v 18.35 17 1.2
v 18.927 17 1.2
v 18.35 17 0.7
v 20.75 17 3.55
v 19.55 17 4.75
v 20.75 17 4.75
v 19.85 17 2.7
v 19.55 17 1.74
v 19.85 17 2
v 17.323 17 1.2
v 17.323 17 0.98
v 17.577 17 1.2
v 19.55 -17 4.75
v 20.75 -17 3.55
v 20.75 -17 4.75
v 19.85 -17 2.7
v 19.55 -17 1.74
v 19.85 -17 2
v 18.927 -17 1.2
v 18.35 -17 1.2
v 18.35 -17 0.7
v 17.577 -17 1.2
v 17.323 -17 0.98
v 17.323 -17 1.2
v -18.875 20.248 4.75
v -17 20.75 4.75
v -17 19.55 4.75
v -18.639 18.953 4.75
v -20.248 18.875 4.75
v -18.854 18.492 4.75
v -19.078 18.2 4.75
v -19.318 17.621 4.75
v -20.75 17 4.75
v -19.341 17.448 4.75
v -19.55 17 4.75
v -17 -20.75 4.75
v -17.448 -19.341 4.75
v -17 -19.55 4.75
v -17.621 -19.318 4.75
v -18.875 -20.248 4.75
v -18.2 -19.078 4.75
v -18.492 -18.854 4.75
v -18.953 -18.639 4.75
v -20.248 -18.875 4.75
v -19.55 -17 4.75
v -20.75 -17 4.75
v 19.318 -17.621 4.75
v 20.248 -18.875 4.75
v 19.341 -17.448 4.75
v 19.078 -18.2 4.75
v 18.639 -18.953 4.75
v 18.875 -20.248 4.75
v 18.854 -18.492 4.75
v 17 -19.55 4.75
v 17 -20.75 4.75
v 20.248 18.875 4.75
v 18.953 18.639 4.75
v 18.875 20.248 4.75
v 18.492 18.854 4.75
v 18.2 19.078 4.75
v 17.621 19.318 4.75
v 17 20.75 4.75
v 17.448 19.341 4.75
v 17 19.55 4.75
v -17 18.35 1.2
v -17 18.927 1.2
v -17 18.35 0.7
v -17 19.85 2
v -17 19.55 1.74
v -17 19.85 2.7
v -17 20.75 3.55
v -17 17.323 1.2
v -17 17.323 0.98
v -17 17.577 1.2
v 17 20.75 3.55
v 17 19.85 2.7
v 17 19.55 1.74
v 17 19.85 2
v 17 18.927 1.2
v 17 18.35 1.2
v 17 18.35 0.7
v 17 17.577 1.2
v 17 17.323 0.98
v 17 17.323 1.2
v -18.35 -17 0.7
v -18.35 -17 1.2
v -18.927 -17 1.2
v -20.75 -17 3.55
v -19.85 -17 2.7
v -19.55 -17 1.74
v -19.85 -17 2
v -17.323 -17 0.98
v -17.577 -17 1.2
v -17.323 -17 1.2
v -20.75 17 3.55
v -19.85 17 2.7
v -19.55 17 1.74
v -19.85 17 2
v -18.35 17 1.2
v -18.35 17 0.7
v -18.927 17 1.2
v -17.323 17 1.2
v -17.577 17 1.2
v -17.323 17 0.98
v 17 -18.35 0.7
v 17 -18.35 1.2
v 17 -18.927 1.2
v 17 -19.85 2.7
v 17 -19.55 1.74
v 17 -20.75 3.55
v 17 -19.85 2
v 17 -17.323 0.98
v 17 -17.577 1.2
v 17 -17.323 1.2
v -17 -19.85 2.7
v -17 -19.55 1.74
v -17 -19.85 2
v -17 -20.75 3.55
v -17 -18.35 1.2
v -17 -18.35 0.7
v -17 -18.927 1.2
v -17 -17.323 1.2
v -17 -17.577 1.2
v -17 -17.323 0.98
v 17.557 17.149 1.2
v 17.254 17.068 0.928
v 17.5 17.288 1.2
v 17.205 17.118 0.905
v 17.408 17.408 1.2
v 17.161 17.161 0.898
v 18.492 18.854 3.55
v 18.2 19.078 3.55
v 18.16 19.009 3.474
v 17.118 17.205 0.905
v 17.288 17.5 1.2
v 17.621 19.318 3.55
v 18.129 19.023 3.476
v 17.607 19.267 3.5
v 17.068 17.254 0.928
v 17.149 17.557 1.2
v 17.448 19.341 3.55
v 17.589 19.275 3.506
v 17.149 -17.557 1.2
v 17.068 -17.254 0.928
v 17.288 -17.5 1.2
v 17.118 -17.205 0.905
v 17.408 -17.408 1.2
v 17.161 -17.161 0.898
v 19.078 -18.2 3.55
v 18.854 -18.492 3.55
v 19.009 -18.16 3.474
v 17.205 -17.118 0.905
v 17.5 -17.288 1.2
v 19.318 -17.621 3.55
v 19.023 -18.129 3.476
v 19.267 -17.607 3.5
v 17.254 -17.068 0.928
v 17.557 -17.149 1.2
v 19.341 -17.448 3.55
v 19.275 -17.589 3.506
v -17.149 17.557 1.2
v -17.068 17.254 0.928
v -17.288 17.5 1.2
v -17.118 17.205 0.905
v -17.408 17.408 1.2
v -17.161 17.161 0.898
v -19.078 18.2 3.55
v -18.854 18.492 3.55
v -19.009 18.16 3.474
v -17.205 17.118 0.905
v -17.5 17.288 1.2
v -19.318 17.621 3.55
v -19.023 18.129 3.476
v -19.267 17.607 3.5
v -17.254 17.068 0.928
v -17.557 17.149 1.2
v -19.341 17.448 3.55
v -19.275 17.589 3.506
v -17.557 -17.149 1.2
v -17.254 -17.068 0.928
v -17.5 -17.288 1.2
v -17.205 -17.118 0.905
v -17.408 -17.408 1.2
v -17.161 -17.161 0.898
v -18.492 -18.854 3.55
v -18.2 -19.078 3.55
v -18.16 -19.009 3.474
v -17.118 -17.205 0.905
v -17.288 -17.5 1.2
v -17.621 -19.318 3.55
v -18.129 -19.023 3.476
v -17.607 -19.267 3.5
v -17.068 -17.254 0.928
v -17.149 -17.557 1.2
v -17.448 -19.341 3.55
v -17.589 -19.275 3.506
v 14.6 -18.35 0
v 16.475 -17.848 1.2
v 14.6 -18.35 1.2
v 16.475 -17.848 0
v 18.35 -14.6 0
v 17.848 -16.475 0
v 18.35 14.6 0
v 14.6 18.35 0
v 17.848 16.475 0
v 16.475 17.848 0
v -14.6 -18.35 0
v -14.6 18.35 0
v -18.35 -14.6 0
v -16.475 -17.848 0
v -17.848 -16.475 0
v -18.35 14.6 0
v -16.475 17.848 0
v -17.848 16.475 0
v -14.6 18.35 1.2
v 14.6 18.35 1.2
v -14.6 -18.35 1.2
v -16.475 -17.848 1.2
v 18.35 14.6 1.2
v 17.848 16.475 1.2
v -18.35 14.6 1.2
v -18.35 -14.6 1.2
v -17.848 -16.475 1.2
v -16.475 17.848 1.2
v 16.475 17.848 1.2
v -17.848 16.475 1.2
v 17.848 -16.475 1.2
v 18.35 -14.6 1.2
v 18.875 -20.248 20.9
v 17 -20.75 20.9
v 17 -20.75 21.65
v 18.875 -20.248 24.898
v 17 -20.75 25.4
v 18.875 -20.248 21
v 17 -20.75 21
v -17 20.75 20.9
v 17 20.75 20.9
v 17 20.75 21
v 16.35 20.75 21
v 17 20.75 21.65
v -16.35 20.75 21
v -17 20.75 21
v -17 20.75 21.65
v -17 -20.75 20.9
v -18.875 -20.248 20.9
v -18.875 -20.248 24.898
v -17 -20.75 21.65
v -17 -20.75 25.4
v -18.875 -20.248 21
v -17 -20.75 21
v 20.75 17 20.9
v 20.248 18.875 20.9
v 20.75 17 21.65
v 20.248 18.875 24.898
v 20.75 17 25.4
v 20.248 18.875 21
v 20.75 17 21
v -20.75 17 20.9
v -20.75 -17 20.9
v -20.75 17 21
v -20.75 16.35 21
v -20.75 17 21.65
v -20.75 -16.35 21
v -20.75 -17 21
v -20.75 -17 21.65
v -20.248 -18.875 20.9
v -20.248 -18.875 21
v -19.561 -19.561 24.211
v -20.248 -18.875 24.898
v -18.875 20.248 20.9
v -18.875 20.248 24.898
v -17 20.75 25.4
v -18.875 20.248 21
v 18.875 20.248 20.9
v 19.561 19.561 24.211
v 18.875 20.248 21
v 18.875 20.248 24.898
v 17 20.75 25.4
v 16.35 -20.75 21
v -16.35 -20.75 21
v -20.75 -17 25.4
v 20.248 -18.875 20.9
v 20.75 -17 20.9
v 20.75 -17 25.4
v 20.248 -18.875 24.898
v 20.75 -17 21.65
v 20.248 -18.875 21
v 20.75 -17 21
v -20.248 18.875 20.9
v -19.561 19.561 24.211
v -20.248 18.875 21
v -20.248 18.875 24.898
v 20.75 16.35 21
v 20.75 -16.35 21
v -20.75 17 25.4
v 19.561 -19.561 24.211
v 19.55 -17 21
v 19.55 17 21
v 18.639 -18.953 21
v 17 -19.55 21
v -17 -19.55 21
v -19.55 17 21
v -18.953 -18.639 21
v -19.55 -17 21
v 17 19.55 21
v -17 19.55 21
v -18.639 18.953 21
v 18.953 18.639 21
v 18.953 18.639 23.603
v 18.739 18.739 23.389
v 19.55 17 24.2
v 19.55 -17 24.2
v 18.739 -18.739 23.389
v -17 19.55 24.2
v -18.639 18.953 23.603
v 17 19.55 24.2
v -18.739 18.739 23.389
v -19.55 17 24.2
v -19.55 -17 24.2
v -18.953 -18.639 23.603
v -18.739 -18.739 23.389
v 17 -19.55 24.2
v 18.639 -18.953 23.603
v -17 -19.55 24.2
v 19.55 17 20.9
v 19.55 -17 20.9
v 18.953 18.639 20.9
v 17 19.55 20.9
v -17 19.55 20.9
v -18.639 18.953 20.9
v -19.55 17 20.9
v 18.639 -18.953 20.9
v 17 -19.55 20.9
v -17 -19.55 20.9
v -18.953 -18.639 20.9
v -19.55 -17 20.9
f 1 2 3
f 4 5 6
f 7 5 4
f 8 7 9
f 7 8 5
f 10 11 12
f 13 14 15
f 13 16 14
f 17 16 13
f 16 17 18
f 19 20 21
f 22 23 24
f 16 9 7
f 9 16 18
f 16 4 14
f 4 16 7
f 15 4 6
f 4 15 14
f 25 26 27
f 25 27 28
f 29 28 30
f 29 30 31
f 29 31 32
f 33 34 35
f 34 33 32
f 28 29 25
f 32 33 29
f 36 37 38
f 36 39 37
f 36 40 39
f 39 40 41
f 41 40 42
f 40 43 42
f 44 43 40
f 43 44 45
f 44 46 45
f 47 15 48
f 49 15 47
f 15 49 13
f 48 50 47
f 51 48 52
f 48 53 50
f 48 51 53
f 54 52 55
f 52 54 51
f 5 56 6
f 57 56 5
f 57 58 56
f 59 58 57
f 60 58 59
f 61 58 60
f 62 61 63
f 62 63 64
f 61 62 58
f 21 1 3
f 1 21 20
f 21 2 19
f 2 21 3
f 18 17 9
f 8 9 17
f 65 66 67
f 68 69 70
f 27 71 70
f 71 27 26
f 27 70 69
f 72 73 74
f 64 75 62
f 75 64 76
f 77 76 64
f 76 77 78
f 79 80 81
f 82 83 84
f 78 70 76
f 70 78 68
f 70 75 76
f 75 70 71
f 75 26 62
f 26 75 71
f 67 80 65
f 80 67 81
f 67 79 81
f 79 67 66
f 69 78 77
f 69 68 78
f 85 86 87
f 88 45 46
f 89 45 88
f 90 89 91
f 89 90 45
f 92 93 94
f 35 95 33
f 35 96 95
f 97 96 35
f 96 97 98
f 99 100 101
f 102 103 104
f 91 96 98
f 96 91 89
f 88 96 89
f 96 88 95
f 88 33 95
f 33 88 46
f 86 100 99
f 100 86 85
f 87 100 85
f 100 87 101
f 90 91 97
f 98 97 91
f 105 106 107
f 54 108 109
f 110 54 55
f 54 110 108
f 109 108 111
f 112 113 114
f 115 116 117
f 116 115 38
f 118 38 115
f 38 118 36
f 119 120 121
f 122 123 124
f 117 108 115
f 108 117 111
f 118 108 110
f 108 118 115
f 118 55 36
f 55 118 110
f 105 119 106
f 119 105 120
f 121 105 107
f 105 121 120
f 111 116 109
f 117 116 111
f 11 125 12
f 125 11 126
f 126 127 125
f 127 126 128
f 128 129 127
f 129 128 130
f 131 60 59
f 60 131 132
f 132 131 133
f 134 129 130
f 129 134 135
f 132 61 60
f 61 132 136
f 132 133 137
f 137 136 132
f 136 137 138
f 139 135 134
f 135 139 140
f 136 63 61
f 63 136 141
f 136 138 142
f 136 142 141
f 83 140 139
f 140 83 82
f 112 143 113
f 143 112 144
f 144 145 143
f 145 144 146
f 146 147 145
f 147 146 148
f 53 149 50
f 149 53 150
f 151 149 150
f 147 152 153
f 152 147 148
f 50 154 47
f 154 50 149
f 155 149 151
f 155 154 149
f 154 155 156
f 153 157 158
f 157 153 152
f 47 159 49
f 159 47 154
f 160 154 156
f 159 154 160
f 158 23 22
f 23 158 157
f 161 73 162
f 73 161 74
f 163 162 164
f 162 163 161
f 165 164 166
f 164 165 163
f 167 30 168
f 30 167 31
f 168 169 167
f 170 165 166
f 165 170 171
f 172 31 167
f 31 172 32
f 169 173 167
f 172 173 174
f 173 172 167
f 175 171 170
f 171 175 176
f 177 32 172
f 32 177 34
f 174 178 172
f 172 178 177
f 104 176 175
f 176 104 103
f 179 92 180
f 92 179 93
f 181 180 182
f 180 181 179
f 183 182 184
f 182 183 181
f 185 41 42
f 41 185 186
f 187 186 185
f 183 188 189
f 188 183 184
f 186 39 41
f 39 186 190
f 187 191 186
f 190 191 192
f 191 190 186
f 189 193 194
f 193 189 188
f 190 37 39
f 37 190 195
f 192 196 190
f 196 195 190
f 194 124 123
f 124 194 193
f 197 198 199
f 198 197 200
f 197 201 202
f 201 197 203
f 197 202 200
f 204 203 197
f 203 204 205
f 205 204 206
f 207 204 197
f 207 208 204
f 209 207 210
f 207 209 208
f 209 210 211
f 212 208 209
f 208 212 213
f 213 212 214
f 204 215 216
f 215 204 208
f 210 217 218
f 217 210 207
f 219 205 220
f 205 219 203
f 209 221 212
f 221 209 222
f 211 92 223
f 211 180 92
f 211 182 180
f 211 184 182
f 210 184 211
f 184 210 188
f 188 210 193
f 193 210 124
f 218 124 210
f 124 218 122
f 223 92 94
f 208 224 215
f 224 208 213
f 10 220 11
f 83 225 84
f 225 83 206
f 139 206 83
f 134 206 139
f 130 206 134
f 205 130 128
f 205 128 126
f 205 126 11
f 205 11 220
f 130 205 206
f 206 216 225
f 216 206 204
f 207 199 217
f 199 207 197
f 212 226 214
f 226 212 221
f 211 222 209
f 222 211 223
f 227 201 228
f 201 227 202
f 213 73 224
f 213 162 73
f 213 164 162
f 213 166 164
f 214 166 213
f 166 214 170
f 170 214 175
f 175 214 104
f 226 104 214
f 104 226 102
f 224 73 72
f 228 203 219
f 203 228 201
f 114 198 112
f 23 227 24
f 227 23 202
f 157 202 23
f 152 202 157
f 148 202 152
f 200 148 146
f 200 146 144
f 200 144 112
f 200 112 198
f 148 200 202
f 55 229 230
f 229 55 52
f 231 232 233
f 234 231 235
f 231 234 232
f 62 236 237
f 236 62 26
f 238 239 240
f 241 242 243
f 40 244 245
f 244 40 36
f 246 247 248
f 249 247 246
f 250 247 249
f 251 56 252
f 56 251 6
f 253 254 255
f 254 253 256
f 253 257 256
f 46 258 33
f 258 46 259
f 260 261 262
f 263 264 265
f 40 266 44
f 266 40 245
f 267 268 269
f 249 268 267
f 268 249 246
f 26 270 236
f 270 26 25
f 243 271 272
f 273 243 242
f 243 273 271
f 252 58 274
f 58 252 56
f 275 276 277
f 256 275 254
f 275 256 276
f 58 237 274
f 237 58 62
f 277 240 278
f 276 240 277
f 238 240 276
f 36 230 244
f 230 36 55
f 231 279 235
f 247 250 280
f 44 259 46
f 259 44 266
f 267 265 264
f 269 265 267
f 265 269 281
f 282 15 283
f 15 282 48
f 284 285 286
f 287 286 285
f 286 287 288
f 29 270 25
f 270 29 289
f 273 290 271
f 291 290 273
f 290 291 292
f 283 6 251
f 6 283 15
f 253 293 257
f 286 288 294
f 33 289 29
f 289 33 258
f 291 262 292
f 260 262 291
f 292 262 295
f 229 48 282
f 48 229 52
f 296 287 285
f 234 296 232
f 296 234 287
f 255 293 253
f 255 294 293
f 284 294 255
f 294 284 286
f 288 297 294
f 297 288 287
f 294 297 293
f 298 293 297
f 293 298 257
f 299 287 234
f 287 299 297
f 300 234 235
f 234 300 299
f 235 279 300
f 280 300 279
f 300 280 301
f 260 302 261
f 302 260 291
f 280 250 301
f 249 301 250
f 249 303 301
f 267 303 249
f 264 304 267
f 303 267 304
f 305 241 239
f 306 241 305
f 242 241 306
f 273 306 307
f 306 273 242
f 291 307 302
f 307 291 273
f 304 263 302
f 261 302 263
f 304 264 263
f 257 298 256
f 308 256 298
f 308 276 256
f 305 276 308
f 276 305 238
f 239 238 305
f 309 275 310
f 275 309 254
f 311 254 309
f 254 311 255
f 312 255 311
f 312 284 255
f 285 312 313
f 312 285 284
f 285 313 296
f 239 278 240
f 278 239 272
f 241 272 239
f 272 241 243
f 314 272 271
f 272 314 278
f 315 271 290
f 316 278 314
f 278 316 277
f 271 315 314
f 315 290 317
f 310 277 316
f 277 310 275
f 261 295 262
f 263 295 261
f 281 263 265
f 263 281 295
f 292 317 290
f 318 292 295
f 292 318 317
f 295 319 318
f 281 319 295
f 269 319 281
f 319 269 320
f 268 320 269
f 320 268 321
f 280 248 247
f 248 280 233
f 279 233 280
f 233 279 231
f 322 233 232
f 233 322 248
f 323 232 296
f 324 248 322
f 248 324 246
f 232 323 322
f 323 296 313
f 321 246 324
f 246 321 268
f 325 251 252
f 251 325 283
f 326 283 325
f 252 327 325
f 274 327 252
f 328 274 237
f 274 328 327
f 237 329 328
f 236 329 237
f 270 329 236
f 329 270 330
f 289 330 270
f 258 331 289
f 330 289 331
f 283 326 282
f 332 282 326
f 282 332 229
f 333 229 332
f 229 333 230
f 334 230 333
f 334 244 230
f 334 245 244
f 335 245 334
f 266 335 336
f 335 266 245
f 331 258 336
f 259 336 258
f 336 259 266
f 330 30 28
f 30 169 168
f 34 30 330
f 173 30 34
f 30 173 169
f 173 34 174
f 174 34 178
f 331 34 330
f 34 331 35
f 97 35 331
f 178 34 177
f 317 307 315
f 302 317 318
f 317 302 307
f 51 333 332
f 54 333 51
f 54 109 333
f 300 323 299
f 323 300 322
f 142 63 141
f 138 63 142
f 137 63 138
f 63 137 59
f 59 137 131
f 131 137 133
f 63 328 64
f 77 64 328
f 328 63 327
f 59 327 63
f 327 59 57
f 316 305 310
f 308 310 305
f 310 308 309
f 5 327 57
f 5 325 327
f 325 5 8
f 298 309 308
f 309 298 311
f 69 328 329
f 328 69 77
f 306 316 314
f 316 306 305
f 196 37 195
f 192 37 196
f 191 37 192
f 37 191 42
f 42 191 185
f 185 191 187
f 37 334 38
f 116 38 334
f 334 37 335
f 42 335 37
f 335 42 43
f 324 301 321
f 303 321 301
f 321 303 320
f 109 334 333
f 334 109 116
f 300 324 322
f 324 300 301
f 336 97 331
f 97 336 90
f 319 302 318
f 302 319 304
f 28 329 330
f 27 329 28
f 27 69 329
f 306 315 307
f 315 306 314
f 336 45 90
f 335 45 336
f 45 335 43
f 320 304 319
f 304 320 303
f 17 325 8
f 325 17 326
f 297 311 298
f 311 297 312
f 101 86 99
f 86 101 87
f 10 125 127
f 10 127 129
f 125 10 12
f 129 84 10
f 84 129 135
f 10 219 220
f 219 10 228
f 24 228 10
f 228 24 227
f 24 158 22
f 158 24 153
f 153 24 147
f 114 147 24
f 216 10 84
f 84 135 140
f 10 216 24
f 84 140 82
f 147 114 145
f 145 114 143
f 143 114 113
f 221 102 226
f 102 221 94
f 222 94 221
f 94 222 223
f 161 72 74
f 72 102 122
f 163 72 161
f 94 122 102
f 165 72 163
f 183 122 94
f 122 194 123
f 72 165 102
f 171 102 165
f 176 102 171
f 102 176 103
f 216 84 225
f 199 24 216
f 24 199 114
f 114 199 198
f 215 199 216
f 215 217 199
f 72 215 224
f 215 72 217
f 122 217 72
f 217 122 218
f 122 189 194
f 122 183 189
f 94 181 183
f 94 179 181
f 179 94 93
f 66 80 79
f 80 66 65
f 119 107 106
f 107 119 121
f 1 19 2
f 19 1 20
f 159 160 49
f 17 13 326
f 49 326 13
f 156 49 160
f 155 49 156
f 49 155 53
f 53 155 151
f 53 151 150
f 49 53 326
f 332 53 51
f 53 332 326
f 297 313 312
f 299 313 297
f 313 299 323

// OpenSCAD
// Gridfinity Bin Demo
// ビン（箱）のサンプル
//
// 外形: 41.5mm x 41.5mm x 25.4mm (1x1x3)
// 依存: gridfinity.scad
//
// ビルド:
//   openscad -o bin_1x1x3.stl bin_demo.scad

use <../gridfinity.scad>

// ===== Customizer =====

/* [Bin Size] */
// グリッド数 (X)
units_x = 1;  // [1:6]
// グリッド数 (Y)
units_y = 1;  // [1:6]
// 高さユニット数 (7mm単位)
units_z = 3;  // [1:10]

/* [Options] */
// スタッキングリップを追加
lip = true;
// 壁の厚さ (mm)
wall_thickness = 1.2;  // [0.8:0.1:2.0]

// ===== 出力 =====

gridfinity_bin(units_x, units_y, units_z, lip, wall_thickness);
